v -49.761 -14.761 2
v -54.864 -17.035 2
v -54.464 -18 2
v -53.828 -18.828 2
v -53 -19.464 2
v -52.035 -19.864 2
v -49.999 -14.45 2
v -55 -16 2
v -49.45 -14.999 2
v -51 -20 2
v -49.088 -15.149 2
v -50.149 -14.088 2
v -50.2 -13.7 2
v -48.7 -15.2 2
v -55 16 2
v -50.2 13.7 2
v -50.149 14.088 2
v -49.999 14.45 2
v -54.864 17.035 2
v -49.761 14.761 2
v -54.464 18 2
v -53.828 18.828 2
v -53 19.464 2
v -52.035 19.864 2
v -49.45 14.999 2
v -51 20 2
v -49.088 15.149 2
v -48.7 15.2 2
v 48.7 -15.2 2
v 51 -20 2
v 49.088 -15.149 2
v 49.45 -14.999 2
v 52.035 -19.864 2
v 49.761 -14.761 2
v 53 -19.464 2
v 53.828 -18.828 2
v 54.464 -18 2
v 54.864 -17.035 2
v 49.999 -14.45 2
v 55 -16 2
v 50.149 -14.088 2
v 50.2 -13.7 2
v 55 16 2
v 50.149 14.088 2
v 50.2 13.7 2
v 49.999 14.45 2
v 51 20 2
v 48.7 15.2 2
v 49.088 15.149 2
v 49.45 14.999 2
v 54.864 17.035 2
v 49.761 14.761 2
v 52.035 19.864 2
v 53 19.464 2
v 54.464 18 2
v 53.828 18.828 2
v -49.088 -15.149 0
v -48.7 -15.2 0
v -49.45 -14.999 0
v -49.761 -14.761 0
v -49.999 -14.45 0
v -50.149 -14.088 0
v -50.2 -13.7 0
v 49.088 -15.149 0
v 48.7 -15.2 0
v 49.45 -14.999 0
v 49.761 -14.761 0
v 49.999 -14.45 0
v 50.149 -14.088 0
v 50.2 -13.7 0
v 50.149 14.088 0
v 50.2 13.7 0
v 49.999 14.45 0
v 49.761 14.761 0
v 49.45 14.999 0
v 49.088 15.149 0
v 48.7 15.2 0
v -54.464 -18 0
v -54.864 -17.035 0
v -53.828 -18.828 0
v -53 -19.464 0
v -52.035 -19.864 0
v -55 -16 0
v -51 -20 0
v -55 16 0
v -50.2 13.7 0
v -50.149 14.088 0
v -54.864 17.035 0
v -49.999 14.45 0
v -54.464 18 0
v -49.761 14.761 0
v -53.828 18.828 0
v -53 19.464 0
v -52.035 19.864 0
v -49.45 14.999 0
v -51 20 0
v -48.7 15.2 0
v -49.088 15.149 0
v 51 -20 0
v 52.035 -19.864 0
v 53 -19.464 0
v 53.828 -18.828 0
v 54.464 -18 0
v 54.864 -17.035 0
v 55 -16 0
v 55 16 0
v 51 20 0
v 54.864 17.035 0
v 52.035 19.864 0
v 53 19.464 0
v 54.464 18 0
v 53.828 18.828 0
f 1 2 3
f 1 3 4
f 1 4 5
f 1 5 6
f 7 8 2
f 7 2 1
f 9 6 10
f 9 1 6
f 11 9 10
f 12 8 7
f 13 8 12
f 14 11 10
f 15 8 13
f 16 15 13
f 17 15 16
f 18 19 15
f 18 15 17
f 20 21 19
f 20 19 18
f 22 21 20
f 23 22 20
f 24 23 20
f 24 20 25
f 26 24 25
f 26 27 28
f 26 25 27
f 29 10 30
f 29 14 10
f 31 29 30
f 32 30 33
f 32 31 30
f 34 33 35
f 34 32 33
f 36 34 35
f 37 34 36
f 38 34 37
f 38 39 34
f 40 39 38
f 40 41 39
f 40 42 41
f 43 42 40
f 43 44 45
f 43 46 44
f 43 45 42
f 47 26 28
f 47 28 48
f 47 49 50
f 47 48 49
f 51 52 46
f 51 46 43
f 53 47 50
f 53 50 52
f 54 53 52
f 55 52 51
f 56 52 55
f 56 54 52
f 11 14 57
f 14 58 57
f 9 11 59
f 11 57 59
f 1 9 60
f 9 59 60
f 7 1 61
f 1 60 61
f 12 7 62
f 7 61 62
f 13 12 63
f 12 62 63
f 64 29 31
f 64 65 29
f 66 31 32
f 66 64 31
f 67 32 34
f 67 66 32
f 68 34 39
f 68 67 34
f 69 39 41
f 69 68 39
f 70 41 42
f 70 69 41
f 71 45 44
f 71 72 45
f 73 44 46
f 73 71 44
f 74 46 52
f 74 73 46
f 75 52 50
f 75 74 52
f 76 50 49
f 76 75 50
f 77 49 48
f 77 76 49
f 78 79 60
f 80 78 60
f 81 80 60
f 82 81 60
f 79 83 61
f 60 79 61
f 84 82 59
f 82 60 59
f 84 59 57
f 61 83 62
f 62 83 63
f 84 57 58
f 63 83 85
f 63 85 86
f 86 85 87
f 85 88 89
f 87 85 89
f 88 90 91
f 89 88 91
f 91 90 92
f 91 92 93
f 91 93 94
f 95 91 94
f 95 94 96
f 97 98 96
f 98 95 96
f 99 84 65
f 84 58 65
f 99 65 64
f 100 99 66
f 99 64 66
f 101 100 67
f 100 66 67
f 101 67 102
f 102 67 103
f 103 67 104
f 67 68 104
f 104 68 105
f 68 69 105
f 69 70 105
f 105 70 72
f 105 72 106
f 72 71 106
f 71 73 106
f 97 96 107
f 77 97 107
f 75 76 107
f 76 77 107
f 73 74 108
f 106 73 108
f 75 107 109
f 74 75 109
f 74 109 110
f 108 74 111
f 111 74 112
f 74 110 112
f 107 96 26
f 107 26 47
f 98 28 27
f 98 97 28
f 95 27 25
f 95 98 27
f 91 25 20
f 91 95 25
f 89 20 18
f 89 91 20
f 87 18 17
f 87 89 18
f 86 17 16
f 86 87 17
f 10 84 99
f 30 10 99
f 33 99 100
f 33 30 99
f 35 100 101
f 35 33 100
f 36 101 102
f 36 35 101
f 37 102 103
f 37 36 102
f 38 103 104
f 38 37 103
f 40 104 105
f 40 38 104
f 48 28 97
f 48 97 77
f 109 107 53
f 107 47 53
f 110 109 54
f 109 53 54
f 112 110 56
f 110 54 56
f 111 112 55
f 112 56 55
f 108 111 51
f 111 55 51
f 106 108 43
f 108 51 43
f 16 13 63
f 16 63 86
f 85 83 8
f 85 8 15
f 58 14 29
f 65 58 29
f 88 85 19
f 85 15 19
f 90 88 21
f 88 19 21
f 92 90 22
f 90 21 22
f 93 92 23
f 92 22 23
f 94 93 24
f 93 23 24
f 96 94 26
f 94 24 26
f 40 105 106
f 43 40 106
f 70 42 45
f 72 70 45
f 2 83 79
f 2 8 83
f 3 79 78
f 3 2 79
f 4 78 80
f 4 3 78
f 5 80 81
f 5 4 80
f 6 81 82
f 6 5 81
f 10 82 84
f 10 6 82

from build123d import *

# Parameters (mm, degrees)
F0_W     = 110
F0_H     = 40
F1_DEPTH = 2
F2_W     = 100.4
F2_H     = 30.4
F3_DEPTH = 2.001
F4_R     = 4
F5_R     = 1.5


with BuildPart() as f1:
    # F0 (on Top) → F1 (new body)
    with BuildSketch(Plane.XY):
        Rectangle(F0_W, F0_H)
    extrude(amount=F1_DEPTH)

    # F2 (on face) → F3 (cut, through all)
    with BuildSketch(Plane.XY.offset(2)):
        Rectangle(F2_W, F2_H)
    extrude(amount=-F3_DEPTH, mode=Mode.SUBTRACT)

    # F4
    f4_edges = [f1.edges().sort_by_distance(p)[0] for p in [
        (-55, -20, 1),
        (-55, 20, 1),
        (55, -20, 1),
        (55, 20, 1),
    ]]
    fillet(f4_edges, radius=F4_R)

    # F5
    f5_edges = [f1.edges().sort_by_distance(p)[0] for p in [
        (-50.2, 15.2, 1),
        (50.2, 15.2, 1),
        (-50.2, -15.2, 1),
        (50.2, -15.2, 1),
    ]]
    fillet(f5_edges, radius=F5_R)


solid = f1.part
